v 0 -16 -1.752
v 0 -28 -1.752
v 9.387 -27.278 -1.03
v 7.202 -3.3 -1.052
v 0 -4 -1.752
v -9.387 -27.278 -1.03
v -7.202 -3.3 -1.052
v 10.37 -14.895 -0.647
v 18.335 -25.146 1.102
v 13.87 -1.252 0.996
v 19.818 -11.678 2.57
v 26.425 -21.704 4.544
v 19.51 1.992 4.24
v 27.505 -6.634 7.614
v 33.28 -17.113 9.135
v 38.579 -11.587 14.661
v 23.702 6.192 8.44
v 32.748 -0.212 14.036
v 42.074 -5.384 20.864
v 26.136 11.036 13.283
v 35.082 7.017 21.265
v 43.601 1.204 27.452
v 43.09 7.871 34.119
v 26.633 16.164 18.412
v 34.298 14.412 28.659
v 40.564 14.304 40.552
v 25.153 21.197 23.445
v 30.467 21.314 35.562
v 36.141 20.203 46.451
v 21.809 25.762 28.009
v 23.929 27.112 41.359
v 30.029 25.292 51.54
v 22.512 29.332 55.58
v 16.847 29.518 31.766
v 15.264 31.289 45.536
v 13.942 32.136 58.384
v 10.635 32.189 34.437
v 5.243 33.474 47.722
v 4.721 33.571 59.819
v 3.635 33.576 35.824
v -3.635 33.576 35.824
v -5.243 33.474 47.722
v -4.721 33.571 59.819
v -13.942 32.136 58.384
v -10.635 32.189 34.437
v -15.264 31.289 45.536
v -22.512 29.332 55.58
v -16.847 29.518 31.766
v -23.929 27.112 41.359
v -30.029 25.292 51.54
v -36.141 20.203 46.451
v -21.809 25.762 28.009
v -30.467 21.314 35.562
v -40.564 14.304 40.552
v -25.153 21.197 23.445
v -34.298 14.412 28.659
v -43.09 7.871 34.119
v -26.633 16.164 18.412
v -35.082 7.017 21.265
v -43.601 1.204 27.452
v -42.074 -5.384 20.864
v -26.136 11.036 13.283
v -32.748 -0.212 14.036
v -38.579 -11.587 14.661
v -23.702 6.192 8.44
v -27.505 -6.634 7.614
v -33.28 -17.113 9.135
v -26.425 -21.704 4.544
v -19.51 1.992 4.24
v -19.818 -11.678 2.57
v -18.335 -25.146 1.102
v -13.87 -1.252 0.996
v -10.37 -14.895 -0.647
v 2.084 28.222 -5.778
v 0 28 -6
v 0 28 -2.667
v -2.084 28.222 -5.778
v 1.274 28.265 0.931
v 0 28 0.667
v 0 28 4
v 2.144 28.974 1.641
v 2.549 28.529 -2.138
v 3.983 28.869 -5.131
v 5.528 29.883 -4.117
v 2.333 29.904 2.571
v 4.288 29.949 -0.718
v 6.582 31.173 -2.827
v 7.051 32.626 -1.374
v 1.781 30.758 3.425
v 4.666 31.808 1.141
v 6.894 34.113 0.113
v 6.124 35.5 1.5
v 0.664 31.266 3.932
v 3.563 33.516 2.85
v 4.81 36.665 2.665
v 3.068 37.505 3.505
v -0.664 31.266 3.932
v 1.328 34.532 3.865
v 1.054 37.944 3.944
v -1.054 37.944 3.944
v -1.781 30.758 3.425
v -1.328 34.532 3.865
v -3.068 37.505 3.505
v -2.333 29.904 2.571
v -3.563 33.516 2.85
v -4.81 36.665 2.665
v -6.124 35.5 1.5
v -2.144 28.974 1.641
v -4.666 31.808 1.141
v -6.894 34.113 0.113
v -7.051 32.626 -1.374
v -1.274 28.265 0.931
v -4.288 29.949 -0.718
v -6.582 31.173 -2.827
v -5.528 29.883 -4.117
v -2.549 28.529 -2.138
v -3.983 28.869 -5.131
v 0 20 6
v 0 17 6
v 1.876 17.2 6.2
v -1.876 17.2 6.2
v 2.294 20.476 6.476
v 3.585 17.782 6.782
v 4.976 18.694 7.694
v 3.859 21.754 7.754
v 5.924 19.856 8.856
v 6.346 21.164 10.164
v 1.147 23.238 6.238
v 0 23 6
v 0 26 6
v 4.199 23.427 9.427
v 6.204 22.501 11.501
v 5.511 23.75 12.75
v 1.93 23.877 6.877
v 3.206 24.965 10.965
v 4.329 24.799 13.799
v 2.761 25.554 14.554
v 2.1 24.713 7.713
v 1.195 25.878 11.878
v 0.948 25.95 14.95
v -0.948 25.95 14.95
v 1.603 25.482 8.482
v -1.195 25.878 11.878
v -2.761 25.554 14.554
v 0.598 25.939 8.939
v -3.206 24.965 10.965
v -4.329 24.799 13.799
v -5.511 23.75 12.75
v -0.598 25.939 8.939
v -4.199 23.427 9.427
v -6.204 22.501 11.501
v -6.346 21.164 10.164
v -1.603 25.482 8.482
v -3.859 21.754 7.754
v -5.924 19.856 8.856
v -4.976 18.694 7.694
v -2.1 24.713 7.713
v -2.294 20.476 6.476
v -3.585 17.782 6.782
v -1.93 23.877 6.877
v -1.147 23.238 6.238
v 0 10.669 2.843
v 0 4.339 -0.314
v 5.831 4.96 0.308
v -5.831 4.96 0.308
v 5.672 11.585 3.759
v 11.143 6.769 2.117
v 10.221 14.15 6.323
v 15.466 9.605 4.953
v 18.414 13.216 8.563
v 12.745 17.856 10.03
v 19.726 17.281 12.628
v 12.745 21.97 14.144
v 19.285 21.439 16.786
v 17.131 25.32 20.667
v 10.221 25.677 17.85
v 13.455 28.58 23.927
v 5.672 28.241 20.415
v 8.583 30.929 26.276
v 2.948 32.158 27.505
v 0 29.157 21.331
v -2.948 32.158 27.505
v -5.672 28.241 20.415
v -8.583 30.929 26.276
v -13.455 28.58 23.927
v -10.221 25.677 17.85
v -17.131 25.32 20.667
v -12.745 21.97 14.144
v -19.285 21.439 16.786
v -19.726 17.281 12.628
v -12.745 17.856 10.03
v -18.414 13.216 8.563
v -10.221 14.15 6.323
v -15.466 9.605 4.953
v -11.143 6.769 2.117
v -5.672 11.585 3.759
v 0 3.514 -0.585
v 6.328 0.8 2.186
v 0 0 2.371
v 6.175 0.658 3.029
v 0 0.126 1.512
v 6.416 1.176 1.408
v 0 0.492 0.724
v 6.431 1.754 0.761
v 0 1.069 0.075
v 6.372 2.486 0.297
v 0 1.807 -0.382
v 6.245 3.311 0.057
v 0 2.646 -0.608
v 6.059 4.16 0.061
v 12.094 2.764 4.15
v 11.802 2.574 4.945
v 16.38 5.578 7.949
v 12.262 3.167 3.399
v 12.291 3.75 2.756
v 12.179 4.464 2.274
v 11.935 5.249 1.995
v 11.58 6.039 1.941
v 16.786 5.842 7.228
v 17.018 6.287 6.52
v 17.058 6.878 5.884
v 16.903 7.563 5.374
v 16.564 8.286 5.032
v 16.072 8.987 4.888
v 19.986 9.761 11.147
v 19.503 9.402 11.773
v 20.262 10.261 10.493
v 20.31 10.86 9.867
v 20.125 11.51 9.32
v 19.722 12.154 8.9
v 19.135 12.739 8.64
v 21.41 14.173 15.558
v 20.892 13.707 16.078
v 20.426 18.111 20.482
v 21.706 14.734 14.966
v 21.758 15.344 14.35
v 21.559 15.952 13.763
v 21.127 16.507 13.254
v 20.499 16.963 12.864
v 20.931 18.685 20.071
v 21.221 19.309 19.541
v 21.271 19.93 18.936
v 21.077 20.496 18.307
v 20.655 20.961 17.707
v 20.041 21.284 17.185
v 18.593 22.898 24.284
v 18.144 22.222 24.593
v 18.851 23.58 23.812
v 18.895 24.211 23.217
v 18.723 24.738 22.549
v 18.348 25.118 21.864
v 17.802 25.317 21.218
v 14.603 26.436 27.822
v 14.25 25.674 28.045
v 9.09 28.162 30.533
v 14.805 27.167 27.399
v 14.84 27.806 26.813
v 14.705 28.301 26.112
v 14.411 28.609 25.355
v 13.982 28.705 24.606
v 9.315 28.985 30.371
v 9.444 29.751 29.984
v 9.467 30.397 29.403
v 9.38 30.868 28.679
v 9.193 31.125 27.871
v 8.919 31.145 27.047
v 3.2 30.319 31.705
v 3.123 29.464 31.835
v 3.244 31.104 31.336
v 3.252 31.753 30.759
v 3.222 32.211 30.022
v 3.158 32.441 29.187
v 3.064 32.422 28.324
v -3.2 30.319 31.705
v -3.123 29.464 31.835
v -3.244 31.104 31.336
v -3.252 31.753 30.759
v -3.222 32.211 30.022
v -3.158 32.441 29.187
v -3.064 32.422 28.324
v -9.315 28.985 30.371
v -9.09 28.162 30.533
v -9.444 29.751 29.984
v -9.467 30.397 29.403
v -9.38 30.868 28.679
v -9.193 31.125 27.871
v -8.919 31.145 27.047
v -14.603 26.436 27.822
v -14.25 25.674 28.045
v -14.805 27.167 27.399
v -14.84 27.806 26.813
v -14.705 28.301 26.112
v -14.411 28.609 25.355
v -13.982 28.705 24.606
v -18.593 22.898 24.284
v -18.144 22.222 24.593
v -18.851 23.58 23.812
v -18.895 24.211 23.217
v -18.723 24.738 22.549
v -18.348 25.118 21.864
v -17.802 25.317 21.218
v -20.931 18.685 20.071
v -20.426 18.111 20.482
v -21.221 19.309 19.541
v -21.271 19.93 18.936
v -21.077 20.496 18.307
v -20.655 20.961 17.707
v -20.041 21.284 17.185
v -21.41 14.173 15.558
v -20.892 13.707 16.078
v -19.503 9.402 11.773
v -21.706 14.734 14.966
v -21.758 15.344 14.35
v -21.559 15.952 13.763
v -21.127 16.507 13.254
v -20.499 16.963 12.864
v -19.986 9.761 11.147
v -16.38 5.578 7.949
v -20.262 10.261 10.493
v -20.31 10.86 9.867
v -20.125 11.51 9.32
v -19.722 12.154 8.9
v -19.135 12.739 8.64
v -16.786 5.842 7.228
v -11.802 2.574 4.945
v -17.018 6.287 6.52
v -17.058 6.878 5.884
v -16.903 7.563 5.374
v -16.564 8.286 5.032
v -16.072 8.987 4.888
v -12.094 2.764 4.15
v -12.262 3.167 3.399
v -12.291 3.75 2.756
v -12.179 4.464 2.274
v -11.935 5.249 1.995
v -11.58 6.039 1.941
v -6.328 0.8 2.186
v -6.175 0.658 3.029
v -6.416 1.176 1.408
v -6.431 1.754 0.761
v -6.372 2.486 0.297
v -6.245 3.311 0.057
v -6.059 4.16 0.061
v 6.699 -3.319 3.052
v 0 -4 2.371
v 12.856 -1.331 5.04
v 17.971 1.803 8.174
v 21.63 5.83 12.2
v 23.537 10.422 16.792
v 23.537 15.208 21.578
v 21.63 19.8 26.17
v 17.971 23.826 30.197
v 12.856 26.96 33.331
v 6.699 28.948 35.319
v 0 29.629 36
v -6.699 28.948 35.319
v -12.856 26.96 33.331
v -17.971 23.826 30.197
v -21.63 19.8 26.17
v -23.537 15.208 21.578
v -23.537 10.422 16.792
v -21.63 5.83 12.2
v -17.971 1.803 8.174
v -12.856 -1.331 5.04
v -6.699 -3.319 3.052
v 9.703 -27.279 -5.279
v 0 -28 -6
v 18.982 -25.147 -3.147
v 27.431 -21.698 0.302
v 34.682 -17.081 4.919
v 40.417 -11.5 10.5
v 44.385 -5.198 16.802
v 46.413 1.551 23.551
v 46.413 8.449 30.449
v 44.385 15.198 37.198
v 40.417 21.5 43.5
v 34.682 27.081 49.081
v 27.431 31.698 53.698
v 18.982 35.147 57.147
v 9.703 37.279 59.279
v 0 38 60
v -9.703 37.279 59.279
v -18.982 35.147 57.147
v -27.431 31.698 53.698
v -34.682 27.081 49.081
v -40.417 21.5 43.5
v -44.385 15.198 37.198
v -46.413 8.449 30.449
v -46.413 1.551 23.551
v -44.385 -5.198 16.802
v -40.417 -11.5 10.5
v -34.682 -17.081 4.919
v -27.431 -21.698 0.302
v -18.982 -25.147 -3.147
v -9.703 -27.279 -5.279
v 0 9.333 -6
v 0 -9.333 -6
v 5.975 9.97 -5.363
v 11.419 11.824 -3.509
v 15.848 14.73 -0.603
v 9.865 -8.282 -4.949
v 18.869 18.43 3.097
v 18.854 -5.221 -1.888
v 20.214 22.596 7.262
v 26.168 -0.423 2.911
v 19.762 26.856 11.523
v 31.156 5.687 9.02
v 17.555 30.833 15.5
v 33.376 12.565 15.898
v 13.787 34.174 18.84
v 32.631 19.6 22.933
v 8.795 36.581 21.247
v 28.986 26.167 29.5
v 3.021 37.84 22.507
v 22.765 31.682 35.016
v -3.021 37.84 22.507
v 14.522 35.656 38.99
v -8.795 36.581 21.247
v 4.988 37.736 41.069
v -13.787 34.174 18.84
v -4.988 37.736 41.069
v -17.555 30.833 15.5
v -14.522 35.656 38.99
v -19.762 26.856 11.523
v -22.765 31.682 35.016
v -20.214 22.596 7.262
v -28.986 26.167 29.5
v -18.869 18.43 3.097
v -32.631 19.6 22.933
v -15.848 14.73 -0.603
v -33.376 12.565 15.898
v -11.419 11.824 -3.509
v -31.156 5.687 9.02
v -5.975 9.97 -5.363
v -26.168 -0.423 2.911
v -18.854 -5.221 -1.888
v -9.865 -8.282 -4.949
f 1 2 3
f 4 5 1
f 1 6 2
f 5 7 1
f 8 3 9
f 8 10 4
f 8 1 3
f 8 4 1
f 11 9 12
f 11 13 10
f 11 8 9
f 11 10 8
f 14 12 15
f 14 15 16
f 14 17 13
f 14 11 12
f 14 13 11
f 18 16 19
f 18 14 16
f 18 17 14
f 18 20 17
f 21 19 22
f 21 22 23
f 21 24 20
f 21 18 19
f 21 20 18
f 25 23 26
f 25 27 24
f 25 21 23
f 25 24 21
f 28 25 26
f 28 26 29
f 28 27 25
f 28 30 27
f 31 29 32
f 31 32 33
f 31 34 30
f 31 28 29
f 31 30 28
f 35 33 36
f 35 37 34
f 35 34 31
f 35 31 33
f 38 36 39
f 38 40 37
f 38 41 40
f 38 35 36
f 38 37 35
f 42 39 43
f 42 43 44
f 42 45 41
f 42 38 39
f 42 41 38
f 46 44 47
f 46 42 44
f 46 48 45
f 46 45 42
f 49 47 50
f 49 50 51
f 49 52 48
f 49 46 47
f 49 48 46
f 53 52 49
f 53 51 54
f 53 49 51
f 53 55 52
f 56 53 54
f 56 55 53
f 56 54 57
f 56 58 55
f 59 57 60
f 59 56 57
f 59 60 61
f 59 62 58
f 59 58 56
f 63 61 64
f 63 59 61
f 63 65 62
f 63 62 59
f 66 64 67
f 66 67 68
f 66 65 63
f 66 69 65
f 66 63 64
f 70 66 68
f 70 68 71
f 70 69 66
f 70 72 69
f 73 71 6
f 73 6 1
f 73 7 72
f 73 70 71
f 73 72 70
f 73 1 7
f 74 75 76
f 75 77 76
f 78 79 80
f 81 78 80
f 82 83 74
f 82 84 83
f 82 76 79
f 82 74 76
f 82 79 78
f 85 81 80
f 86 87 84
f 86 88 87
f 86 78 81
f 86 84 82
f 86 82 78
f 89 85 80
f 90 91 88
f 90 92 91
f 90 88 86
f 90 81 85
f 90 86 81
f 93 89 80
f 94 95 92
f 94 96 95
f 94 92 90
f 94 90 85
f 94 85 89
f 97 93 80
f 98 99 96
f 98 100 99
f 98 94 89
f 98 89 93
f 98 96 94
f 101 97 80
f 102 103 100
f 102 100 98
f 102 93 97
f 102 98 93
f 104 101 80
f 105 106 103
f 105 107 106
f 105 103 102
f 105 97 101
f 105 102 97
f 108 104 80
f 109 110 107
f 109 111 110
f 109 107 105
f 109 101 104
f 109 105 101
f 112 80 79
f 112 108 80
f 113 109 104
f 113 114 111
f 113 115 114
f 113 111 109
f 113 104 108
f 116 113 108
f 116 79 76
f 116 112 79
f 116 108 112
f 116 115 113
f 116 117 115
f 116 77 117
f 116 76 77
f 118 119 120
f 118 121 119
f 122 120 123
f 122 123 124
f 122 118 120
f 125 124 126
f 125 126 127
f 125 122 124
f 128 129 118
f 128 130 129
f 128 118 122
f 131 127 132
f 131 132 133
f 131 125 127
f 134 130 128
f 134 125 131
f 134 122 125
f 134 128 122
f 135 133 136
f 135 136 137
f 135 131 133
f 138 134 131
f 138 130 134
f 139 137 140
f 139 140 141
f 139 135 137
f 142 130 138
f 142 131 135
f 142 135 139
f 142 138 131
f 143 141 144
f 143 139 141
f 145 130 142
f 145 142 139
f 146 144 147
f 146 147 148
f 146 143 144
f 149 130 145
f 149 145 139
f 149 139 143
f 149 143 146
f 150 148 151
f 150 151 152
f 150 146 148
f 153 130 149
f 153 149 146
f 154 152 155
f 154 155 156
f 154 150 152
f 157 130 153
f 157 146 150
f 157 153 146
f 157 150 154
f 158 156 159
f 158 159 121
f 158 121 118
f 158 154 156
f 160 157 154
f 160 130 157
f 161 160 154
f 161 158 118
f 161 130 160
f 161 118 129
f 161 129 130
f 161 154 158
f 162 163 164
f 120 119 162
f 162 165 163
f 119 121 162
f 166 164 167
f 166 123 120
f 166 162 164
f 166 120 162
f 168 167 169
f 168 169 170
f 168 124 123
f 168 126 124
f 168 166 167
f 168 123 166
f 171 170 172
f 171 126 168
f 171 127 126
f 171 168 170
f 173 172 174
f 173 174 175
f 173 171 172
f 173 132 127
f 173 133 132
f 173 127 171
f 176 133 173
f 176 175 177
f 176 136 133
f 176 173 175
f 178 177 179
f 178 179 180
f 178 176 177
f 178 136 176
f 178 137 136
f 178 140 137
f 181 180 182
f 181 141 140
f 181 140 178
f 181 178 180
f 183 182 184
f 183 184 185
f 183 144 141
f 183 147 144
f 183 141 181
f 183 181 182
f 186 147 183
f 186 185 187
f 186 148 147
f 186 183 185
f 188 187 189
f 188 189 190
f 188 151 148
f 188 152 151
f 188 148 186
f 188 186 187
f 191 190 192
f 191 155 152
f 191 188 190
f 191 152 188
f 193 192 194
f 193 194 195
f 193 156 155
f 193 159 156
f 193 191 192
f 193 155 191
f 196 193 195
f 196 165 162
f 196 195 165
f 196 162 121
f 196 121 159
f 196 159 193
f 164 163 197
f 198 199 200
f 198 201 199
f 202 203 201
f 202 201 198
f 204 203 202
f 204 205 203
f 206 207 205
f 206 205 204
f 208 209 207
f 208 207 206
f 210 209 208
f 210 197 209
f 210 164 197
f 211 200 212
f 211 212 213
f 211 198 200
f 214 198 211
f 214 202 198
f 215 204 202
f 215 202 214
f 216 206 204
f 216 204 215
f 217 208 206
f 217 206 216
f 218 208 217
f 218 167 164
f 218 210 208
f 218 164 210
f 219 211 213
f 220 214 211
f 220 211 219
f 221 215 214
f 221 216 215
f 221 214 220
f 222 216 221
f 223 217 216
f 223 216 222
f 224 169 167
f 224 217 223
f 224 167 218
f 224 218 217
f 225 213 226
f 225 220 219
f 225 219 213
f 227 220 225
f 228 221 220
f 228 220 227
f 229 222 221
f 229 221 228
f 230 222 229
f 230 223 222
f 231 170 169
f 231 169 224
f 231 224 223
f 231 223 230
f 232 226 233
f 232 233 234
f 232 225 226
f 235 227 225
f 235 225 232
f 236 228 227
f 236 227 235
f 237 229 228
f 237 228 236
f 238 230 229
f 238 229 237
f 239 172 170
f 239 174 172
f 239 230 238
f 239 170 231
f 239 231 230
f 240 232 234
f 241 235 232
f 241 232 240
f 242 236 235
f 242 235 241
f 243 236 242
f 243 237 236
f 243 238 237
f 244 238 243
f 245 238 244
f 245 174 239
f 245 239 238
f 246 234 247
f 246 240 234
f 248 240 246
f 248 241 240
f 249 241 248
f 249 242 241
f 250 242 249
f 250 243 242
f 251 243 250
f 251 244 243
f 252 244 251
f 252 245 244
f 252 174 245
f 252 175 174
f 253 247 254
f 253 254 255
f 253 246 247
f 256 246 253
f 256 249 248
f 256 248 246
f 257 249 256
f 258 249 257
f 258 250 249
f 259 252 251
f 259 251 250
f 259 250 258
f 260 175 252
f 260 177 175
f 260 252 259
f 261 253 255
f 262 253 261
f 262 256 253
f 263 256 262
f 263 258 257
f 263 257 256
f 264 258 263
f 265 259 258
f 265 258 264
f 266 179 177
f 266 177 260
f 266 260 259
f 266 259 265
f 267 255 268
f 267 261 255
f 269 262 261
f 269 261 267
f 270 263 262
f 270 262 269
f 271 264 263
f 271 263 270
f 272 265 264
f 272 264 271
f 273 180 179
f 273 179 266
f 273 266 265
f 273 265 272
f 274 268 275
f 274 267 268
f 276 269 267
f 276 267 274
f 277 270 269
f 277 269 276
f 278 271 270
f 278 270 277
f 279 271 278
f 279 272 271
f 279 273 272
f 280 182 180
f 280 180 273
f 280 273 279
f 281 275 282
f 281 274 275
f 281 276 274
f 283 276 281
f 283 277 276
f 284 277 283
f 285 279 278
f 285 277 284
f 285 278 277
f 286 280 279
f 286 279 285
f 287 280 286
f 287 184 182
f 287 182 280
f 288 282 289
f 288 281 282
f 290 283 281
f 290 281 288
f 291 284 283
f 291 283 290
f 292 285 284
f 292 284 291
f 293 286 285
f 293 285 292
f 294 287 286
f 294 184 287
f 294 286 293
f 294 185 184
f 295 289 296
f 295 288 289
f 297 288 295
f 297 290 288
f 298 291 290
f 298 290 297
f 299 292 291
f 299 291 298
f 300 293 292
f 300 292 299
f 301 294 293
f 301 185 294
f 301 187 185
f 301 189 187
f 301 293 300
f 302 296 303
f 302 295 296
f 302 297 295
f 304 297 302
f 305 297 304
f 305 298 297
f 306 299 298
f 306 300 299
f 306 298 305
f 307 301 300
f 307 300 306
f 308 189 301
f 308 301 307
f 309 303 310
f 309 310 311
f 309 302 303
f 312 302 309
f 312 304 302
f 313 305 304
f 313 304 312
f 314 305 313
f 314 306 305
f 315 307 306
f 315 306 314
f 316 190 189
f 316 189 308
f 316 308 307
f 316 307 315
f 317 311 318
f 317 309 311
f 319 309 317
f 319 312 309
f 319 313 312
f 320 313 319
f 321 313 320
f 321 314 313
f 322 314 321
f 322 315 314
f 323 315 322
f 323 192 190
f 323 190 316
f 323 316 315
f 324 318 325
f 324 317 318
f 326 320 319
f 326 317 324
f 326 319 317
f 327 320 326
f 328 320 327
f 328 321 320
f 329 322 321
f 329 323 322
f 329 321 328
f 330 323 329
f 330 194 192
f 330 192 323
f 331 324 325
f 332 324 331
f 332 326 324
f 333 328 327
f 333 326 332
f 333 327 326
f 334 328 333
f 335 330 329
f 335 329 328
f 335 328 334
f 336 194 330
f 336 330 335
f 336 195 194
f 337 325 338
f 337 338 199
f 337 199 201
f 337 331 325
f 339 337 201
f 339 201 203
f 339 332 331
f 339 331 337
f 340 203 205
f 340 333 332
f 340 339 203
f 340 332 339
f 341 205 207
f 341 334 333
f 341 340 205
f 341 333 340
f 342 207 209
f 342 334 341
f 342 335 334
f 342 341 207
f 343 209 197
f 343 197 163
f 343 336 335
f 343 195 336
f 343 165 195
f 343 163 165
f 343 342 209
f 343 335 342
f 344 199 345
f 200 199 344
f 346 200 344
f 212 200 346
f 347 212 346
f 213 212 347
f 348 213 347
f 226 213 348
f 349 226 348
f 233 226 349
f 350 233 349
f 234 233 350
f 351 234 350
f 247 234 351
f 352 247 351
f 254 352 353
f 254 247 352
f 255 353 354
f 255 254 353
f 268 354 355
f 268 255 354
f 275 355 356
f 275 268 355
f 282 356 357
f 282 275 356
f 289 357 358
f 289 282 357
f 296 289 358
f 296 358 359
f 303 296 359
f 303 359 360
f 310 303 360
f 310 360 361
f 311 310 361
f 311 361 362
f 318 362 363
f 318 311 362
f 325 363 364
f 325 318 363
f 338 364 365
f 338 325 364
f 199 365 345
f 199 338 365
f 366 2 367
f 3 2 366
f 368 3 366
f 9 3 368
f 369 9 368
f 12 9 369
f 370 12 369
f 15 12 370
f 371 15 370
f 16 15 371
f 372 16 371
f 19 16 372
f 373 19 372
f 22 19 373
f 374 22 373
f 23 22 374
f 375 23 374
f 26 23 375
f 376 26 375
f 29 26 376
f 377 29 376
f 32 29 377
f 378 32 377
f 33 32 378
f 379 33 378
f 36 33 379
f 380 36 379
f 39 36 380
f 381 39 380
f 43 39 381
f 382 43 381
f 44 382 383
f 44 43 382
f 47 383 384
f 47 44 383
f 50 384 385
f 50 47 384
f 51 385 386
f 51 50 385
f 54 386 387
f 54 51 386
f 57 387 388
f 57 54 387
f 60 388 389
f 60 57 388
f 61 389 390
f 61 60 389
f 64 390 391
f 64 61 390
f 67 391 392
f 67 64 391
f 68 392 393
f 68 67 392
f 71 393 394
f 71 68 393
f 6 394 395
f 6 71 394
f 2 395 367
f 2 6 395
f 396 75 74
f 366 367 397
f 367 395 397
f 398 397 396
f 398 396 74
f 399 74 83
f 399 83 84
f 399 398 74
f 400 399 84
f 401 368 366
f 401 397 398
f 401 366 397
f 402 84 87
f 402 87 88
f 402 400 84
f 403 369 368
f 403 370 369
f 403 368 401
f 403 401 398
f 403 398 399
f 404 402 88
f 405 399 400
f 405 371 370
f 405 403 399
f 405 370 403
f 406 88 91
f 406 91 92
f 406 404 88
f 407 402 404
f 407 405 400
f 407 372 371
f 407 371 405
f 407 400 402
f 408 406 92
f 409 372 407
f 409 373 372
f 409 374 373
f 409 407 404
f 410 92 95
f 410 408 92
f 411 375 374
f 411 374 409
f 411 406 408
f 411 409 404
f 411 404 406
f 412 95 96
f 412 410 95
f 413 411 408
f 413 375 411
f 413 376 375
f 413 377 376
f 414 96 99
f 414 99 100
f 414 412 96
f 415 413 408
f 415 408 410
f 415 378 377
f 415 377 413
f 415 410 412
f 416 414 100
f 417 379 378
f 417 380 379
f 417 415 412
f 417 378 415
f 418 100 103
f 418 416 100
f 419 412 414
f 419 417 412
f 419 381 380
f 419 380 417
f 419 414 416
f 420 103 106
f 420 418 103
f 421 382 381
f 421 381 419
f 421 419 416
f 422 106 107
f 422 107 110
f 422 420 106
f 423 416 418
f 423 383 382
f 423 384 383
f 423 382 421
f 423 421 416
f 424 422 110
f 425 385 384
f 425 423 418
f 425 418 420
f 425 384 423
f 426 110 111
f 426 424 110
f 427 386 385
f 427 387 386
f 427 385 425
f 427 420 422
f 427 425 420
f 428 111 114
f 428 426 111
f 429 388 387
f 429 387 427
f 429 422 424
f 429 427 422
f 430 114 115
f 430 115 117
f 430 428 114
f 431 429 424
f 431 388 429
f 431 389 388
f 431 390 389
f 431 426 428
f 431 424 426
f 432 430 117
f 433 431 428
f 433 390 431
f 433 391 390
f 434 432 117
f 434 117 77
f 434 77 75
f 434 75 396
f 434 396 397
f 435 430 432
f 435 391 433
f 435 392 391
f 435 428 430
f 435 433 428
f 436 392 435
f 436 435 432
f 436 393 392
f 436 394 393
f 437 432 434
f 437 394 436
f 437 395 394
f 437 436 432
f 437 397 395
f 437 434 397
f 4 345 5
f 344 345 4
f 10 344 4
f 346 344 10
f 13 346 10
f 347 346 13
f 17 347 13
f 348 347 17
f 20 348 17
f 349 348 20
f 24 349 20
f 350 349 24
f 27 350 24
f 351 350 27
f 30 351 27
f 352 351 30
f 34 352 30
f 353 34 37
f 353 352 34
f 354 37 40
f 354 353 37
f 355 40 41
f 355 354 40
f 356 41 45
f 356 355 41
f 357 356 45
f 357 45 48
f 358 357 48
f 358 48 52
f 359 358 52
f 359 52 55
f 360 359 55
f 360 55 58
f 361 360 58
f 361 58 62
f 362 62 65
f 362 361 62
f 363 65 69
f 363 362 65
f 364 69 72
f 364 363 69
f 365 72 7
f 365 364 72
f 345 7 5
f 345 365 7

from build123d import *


with BuildPart() as part:
    # Esboço5 → Revolução1 (revolve)
    with BuildSketch(Plane(origin=(0, 0, 0), x_dir=(0, 0, -1), z_dir=(1, 0, 0))):
        with BuildLine():
            Line((-4, 28), (6, 28))
            Line((6, 28), (6, -28))
            Line((6, -28), (1.752133554, -28))
            Line((1.752133554, -28), (1.752133554, -4))
            Line((1.752133554, -4), (-2.370874425, -4))
            Line((-2.370874425, -4), (-2.370874425, 0))
            ThreePointArc((-2.370874425, 0), (0.180241373, 1.421453775), (0.313828383, 4.338794544))
            Line((0.313828383, 4.338794544), (-6, 17))
            Line((-6, 17), (-6, 26))
            Line((-6, 26), (-4, 28))
        make_face()
    revolve(axis=Axis((0, 28, 4), (0, -0.7071067811865436, 0.7071067811865516)))


solid = part.part
